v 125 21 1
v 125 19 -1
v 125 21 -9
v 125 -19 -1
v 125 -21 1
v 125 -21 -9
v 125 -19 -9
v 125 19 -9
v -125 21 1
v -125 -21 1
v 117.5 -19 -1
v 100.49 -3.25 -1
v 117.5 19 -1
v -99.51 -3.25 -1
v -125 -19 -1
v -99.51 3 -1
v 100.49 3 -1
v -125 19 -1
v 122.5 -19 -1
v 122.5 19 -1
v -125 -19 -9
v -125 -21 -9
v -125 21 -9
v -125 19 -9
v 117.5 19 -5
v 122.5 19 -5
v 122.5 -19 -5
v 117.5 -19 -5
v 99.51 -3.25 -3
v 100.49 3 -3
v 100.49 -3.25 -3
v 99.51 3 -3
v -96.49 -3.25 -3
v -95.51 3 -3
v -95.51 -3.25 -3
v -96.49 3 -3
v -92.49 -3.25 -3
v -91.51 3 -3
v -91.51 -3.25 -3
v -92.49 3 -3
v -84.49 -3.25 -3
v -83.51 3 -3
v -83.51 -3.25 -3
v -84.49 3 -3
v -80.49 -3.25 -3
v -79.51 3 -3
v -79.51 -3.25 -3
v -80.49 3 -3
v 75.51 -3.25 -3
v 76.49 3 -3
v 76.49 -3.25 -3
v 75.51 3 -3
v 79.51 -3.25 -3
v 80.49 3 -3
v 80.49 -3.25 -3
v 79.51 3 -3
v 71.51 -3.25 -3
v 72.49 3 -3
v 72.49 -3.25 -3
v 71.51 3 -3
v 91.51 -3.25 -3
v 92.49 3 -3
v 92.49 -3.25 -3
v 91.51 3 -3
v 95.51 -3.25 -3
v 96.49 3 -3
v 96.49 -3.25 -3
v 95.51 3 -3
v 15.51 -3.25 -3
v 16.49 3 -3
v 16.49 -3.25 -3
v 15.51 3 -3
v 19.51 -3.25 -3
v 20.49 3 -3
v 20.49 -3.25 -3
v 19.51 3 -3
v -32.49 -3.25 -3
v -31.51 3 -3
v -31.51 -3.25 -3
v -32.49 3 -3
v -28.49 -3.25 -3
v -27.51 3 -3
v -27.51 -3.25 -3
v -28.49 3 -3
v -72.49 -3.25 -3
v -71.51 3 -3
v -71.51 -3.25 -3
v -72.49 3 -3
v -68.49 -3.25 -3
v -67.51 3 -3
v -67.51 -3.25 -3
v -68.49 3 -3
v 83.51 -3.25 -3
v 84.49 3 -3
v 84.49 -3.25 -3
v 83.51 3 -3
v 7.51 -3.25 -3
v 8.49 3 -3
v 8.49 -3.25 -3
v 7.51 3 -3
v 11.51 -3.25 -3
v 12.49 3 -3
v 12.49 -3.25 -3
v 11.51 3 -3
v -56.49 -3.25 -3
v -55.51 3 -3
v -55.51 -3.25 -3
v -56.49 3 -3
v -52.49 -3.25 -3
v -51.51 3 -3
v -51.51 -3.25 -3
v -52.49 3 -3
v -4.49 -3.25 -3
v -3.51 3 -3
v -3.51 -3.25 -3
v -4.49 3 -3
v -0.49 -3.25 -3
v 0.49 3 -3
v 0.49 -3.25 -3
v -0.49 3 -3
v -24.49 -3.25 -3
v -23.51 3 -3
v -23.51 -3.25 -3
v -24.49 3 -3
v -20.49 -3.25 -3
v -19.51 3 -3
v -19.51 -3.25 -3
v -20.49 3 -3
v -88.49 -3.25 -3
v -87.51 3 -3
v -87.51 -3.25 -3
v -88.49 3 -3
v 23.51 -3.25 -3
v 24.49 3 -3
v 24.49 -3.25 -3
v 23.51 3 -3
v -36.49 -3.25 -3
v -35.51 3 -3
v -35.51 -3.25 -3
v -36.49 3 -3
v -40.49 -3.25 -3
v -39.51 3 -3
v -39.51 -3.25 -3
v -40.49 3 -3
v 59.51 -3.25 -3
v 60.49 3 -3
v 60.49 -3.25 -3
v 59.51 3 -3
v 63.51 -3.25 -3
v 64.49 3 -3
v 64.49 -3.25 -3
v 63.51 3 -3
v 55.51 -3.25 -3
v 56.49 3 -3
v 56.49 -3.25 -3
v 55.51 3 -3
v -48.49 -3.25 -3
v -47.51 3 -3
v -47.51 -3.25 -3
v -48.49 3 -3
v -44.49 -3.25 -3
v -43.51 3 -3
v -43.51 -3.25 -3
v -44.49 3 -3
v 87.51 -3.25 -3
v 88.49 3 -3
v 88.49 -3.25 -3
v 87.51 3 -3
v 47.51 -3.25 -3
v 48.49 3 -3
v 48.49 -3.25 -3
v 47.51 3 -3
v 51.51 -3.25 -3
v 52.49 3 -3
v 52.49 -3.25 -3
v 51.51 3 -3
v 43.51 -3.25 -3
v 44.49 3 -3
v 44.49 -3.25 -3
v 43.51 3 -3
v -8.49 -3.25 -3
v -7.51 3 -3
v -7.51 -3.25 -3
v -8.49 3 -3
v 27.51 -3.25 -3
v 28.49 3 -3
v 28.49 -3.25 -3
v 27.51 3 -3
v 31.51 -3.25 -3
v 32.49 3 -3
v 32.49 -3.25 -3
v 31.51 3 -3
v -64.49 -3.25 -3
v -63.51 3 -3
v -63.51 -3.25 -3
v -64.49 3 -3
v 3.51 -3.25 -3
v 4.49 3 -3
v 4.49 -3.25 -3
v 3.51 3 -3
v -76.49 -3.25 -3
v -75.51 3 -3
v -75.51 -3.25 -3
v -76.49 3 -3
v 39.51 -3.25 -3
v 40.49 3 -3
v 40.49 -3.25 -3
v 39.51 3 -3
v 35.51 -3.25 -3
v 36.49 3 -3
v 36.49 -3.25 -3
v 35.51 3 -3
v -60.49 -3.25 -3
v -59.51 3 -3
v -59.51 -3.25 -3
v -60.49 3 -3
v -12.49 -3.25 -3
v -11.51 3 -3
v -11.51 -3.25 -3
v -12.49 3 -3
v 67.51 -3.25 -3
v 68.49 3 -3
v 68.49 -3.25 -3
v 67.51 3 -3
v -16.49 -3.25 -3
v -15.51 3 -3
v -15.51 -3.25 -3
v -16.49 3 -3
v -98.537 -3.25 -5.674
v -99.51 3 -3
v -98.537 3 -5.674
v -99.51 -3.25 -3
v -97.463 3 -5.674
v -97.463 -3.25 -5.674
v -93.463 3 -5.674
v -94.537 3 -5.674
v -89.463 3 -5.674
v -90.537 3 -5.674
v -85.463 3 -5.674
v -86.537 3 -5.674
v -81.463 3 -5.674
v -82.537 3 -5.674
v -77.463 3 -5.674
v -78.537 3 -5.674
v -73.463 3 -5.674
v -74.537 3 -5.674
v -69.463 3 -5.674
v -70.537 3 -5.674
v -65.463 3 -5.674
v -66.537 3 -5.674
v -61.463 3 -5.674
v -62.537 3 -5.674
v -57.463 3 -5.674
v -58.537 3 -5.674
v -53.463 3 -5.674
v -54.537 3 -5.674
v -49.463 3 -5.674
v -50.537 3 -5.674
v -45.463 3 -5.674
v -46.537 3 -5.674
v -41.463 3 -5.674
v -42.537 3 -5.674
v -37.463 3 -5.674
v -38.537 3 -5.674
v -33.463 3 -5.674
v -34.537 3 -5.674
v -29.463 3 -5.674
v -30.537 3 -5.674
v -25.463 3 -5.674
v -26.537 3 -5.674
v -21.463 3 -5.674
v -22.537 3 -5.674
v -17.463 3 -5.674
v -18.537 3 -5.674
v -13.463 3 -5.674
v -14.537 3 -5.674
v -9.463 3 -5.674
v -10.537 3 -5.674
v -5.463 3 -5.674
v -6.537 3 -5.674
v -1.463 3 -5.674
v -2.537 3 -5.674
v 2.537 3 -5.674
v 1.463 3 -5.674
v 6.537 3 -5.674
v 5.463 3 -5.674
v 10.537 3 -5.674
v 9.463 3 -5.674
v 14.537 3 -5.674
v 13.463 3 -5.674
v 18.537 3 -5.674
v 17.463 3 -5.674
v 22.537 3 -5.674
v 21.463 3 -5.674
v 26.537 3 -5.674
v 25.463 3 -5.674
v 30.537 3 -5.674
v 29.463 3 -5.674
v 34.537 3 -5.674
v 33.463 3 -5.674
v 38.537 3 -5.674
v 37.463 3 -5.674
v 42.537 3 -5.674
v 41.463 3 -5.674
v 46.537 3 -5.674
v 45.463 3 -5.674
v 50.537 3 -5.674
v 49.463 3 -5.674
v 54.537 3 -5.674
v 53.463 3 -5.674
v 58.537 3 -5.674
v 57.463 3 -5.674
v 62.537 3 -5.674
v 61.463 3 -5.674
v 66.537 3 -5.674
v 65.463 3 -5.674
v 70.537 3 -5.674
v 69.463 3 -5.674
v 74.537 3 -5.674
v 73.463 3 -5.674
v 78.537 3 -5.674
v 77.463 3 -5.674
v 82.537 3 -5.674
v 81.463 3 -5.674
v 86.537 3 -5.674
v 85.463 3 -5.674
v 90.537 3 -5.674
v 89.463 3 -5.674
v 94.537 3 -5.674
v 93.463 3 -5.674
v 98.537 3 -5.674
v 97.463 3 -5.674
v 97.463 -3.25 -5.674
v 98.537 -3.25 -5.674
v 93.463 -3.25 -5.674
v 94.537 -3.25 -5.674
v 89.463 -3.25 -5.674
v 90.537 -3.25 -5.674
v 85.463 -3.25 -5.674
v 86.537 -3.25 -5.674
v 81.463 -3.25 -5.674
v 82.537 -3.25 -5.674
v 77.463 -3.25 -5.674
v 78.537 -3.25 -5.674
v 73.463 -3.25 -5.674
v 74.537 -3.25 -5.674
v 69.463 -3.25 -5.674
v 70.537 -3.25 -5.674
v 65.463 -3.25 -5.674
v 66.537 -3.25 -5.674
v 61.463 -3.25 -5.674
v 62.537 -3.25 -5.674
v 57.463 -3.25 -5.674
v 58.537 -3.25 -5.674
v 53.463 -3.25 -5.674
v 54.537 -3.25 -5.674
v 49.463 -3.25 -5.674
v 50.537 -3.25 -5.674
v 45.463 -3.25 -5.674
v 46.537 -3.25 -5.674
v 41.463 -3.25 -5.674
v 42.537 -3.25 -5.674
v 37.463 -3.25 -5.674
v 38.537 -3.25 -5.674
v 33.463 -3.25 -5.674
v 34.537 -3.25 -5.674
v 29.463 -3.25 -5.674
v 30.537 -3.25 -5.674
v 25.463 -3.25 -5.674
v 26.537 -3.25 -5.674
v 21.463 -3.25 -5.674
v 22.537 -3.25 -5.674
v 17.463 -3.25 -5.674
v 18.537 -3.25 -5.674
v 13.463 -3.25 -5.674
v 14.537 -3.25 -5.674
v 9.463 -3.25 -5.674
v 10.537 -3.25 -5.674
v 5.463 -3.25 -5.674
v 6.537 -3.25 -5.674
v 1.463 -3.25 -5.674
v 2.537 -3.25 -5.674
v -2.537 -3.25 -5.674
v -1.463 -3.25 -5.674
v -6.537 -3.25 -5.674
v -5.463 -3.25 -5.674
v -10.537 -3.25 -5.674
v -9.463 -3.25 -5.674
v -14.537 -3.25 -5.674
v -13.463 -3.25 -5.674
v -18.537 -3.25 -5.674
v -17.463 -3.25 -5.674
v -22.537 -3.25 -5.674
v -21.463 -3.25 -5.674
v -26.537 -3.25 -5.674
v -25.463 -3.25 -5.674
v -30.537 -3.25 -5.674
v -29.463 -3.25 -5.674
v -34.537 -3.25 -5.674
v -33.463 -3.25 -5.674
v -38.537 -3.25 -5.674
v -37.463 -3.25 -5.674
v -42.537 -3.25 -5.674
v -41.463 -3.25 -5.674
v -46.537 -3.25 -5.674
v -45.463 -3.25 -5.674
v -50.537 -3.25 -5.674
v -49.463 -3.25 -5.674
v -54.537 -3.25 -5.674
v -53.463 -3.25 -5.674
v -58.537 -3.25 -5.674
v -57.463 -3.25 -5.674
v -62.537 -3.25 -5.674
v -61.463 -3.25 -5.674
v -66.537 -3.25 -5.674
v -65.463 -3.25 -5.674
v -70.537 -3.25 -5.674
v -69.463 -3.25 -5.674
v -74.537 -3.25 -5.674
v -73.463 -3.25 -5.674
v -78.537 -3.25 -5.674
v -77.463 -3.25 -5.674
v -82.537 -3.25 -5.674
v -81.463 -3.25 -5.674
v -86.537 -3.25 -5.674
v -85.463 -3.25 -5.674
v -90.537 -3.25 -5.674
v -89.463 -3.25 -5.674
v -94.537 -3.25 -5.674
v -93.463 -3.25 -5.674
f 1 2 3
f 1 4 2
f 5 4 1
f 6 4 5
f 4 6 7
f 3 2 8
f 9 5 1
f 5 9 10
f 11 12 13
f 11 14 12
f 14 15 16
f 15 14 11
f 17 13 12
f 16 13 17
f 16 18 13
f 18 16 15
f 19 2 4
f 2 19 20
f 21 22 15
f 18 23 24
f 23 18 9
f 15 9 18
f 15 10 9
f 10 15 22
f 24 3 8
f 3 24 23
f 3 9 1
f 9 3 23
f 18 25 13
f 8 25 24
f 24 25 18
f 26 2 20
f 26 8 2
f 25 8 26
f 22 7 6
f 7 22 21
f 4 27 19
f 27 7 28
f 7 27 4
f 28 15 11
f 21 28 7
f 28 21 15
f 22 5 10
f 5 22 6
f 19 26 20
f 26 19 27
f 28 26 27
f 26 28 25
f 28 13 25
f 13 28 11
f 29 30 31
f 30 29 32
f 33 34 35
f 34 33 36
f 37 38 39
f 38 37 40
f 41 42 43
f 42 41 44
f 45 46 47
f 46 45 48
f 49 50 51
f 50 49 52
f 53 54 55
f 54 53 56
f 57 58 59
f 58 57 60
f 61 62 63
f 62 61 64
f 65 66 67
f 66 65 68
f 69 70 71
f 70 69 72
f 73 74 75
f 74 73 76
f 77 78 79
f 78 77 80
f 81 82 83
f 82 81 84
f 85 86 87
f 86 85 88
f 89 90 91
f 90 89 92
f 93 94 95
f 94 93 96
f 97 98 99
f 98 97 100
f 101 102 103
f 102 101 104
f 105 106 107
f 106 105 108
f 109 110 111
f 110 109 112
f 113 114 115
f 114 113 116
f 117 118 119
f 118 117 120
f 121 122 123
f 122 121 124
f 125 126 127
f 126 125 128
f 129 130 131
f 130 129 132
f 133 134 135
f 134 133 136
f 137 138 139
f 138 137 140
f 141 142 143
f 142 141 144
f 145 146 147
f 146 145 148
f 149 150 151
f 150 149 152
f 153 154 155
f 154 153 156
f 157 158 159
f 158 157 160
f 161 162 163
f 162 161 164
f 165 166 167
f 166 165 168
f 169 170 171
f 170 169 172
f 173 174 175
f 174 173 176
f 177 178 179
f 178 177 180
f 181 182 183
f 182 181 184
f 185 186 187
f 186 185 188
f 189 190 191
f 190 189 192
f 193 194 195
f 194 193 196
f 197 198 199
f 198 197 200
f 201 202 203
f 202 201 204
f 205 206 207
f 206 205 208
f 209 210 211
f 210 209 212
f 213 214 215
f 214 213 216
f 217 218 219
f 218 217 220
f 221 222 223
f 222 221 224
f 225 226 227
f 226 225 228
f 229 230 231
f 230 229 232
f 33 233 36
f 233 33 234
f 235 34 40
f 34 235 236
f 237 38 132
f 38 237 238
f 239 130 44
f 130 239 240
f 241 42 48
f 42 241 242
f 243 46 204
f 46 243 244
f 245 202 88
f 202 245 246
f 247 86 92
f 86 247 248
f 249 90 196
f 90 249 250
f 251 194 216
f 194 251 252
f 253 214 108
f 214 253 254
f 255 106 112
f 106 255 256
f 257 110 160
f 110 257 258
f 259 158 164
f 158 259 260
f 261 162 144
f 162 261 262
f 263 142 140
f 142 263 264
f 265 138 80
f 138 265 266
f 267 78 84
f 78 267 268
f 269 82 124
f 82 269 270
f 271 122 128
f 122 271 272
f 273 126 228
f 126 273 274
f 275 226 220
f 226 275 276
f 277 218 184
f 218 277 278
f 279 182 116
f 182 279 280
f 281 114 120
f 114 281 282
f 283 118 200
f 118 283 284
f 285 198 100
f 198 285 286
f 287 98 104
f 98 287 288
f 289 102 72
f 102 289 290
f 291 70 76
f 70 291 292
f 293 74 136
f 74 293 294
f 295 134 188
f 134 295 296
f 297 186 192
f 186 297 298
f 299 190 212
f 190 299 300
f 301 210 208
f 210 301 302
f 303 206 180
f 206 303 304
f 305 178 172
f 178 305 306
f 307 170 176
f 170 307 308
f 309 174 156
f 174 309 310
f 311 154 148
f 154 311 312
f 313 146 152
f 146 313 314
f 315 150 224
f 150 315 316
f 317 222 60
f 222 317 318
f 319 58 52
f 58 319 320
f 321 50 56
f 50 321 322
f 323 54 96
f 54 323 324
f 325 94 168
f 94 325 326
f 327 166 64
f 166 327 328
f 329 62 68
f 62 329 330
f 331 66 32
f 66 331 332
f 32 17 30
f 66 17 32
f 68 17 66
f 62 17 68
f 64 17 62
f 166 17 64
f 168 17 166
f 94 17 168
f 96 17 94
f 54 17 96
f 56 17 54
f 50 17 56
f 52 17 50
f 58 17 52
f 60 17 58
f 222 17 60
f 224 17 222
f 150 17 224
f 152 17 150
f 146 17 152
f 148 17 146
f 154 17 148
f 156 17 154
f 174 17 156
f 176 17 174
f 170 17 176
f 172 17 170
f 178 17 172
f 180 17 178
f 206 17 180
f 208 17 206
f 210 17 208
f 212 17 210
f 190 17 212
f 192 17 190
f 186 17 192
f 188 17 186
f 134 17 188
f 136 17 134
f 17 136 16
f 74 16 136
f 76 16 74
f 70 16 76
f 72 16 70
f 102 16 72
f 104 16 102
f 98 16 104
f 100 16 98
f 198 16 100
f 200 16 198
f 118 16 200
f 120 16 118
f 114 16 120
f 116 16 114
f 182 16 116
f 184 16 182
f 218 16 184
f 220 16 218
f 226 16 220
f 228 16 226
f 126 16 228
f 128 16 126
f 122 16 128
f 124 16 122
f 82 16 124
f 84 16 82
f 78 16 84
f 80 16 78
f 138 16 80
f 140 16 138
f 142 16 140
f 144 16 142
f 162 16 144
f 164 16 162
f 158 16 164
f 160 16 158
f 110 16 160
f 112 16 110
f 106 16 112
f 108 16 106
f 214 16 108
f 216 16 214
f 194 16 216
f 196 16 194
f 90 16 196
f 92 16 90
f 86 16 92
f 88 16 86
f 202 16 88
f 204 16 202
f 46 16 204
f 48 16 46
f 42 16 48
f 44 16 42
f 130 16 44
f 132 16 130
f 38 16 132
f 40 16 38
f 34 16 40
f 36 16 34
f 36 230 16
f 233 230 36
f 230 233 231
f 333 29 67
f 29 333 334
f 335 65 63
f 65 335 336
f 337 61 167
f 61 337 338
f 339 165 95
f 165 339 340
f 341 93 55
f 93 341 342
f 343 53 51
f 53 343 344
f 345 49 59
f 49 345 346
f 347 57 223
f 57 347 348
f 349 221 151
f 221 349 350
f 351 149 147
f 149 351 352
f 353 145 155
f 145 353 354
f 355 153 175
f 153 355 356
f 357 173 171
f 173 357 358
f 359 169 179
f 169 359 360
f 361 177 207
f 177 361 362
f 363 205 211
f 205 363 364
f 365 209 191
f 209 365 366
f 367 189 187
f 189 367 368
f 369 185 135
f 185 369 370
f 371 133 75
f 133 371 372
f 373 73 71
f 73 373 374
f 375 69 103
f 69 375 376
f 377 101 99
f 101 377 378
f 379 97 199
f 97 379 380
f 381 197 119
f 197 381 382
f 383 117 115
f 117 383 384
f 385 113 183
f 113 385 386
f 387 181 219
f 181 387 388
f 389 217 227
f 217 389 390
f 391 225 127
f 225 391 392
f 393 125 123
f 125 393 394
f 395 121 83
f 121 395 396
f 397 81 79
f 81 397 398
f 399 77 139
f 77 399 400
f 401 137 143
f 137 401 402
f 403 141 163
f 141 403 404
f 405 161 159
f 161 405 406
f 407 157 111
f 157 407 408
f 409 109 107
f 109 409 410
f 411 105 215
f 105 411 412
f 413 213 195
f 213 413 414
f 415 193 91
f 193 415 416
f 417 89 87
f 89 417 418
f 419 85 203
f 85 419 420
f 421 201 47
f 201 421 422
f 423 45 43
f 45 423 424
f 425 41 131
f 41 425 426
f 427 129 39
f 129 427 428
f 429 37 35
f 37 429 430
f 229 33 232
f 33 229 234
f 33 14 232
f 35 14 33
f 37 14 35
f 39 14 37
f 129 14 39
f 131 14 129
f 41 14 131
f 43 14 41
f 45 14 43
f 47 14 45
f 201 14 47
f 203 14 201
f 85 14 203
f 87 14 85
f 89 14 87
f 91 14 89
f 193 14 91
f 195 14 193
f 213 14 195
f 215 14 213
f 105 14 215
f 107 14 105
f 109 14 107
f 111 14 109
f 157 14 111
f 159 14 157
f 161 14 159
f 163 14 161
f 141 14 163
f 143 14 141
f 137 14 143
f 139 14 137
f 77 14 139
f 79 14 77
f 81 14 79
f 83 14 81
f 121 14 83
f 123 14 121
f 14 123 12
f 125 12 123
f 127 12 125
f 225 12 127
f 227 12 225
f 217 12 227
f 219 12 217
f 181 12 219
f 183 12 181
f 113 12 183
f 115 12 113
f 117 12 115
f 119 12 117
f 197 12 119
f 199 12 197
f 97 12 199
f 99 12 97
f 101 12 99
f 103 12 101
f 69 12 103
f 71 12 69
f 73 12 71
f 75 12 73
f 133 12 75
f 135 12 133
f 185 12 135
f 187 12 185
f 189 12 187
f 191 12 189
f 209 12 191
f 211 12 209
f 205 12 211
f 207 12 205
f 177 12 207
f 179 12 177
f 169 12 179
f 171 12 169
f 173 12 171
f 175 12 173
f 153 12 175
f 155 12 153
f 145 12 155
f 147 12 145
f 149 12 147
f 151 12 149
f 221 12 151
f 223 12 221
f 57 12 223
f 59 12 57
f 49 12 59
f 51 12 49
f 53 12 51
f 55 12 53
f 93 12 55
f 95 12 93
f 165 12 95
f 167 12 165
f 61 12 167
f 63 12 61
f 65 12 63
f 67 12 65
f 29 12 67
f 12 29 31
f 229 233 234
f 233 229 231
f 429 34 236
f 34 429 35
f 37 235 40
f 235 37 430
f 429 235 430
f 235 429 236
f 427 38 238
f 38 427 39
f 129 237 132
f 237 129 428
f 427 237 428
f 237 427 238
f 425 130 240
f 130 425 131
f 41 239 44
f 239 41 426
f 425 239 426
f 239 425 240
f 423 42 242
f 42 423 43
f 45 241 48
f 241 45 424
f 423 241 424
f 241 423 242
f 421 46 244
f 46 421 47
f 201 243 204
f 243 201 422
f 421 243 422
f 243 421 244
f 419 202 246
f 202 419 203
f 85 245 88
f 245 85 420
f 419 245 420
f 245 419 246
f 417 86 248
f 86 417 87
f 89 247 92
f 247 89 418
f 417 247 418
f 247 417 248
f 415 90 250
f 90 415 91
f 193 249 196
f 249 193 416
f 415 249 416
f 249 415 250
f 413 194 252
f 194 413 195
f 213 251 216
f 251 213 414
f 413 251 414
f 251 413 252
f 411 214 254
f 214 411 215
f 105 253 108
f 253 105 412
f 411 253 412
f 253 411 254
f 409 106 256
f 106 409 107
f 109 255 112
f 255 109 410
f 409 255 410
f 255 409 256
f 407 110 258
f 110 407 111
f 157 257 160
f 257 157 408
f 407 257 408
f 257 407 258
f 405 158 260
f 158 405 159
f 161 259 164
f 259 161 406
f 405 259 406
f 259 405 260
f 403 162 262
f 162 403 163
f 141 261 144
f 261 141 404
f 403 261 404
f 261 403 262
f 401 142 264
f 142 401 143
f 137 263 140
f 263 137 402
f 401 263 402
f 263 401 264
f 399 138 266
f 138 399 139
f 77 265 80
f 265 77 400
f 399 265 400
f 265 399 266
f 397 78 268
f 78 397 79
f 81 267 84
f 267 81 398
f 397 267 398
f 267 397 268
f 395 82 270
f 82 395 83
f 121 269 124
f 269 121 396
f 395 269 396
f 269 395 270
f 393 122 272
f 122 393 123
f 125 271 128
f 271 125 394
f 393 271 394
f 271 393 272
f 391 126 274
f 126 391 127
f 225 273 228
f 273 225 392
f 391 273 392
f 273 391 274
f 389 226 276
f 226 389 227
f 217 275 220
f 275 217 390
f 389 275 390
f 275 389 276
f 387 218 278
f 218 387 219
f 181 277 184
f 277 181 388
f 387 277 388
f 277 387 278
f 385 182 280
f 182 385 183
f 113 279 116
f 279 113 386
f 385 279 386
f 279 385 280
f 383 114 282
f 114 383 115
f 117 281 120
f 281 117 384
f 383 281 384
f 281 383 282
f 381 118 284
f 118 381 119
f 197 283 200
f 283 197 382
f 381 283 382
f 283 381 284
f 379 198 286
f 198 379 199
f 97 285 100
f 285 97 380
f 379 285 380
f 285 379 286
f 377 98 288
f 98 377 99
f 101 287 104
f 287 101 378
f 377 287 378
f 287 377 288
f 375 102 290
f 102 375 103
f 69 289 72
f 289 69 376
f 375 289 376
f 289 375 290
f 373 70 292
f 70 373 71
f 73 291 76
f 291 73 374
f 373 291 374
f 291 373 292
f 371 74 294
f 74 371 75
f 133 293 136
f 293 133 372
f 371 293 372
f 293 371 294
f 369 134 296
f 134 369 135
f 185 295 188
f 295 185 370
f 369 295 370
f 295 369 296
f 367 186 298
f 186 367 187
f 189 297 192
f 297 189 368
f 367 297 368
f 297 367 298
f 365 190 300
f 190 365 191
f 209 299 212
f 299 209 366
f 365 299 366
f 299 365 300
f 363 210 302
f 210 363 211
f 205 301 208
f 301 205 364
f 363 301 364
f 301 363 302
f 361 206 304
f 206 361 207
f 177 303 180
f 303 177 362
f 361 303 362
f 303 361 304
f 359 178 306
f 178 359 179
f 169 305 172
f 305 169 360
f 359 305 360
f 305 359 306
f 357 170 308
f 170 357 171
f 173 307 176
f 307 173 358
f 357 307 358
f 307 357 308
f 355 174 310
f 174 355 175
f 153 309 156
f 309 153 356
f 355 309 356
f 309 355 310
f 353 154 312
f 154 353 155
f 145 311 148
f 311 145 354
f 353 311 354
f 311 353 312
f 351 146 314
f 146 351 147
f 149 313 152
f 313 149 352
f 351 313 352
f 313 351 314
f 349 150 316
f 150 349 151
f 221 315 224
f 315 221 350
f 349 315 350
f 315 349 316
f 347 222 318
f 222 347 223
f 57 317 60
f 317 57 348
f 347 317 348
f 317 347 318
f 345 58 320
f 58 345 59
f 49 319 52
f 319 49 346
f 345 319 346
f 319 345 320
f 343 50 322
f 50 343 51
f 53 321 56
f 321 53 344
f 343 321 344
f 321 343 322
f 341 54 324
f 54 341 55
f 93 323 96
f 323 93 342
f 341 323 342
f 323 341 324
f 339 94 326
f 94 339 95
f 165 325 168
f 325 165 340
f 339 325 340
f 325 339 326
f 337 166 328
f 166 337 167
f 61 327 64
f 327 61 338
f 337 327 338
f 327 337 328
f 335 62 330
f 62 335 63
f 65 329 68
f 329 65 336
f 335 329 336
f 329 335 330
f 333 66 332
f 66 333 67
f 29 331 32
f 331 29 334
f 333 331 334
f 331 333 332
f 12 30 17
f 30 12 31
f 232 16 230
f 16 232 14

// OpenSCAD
//============================================================
pi=3.1415926535897932384626433832795;
$fn=50;
module rack(cp, N, width, thickness){
// cp = circular pitch - for rack = pitch in mm/per tooth
// N = number of teeth
// width = width of rack
// thickness = thickness of support under teeth (0 for no support)

	a = 1.0*cp/pi; // addendum (also known as "module")
	d = 1.1*cp/pi; // dedendum (this is set by a standard)
	height=(d+a);

	// find the tangent of pressure angle once
	tanPA = tan(20);
	// length of bottom and top horizontal segments of tooth profile
	botL = (cp/2 - 2*d*tanPA);
	topL = (cp/2 - 2*a*tanPA);

	slantLng=tanPA*height;
	realBase=2*slantLng+topL;

	offset=topL+botL+2*slantLng;
	length=(realBase+botL)*N;

	supportSize=width;
	translate([botL/2,0,0])
	rotate([90,0,0]){
		translate([0,supportSize/2,0]){
			union(){
				cube(size=[length,width,thickness],center=true);
				for (i = [0:N-1]){
					translate([i*offset-length/2+realBase/2,0,thickness/2]){
						trapezoid([topL,supportSize],[realBase,supportSize],height);
						}
					}
				}
			}
		}
	}

//==========================================================
module pinion (cp, N, width, shaft_diameter, backlash=0){
// cp= circular pitch - for pinion pitch in mm/per as measured along the ptich radius (~1/2 way up tooth)
// N= number of teeth
// width= width of the gear
// shaft_diameter= diameter of hole for shaft
// backlash - I think this is just a bodge for making things fit when printed but I never tested it

	if (cp==false && diametral_pitch==false) 
		echo("MCAD ERROR: pinion module needs either a diametral_pitch or cp");

	//Convert diametrial pitch to our native circular pitch
	cp = (cp!=false?cp:180/diametral_pitch);

	// Pitch diameter: Diameter of pitch circle.
	pitch_diameter  =  N * cp / pi;
	pitch_radius = pitch_diameter/2;
	echo ("Teeth:", N, " Pitch radius:", pitch_radius);
	// Base Circle
	base_radius = pitch_radius*cos(20);

	// Addendum: Radial distance from pitch circle to outside circle.
	addendum = cp/pi;

	//Outer Circle
	outer_radius = pitch_radius+addendum;

	// Dedendum: Radial distance from pitch circle to root diameter
	dedendum = addendum*1.1;

	// Root diameter: Diameter of bottom of tooth spaces.
	root_radius = pitch_radius-dedendum;

	backlash_angle = backlash / pitch_radius * 180 / pi;
	half_thick_angle = (360 / N - backlash_angle) / 4;

	difference(){
		linear_extrude (height=width, convexity=10, twist=0)
		pinion_shape(N, pitch_radius = pitch_radius, root_radius = root_radius,
			base_radius = base_radius, outer_radius = outer_radius,
			half_thick_angle = half_thick_angle, involute_facets=0);

		translate([0,0,-1]) cylinder(r=shaft_diameter/2,h=2+width);
		}

	echo("Root radius =",root_radius,"\nPitch radius=",pitch_radius,"\n Tip radius=",outer_radius,"\n");
	}

module pinion_shape ( N, pitch_radius, root_radius, base_radius, outer_radius, half_thick_angle, involute_facets) {
	union(){
		rotate (half_thick_angle) circle ($fn=N*2, r=root_radius);
		for (i = [1:N]) {
			rotate ([0,0,i*360/N]) {
				involute_pinion_tooth (
					pitch_radius = pitch_radius,
					root_radius = root_radius,
					base_radius = base_radius,
					outer_radius = outer_radius,
					half_thick_angle = half_thick_angle,
					involute_facets=involute_facets);
				}
			}
		}
	}

module involute_pinion_tooth ( pitch_radius, root_radius, base_radius, outer_radius, half_thick_angle, involute_facets) {
	min_radius = max (base_radius,root_radius);

	pitch_point = involute (base_radius, involute_intersect_angle (base_radius, pitch_radius));
	pitch_angle = atan2 (pitch_point[1], pitch_point[0]);
	centre_angle = pitch_angle + half_thick_angle;

	start_angle = involute_intersect_angle (base_radius, min_radius);
	stop_angle = involute_intersect_angle (base_radius, outer_radius);

	res=(involute_facets!=0)?involute_facets:($fn==0)?5:$fn/4;

	union () {
		for (i=[1:res])
		assign ( point1=involute (base_radius,start_angle+(stop_angle - start_angle)*(i-1)/res), point2=involute (base_radius,start_angle+(stop_angle - start_angle)*i/res)) {
			assign (
				side1_point1=rotate_point (centre_angle, point1),
				side1_point2=rotate_point (centre_angle, point2),
				side2_point1=mirror_point (rotate_point (centre_angle, point1)),
				side2_point2=mirror_point (rotate_point (centre_angle, point2))) {
				polygon ( points=[[0,0],side1_point1,side1_point2,side2_point2,side2_point1], paths=[[0,1,2,3,4,0]]);
				}
			}
		}
	}

// Mathematical Functions
//===============

// Finds the angle of the involute about the base radius at the given distance (radius) from it's center.
//source: http://www.mathhelpforum.com/math-help/geometry/136011-circle-involute-solving-y-any-given-x.html

function involute_intersect_angle (base_radius, radius) = sqrt (pow (radius/base_radius, 2) - 1) * 180 / pi;

// Calculate the involute position for a given base radius and involute angle.

function rotated_involute(rotate,base_radius,involute_angle)=[cos(rotate)*involute(base_radius, involute_angle)[0]+sin(rotate)*involute(base_radius, involute_angle)[1],cos(rotate)*involute(base_radius, involute_angle)[1]-sin(rotate)*involute(base_radius, involute_angle)[0]];

function mirror_point(coord)=[coord[0],-coord[1]];

function rotate_point(rotate,coord)=[cos(rotate)*coord[0]+sin(rotate)*coord[1],cos(rotate)*coord[1]-sin(rotate)*coord[0]];

function involute (base_radius, involute_angle)=[base_radius*(cos(involute_angle)+involute_angle*pi/180*sin(involute_angle)),base_radius*(sin(involute_angle)-involute_angle*pi/180*cos(involute_angle))];

module trapezoid(top,base,height){
	//echo ("test",base[0]);
	basePT1=[ -base[0]/2, base[1]/2, 0];
	basePT2=[ base[0]/2, base[1]/2, 0];
	basePT3=[ base[0]/2, -base[1]/2, 0];
	basePT4=[ -base[0]/2, -base[1]/2, 0];
	topPT1=[ -top[0]/2, top[1]/2, height];
	topPT2=[ top[0]/2, top[1]/2, height];
	topPT3=[ top[0]/2, -top[1]/2, height];
	topPT4=[ -top[0]/2, -top[1]/2, height];
	polyhedron(points=[ basePT1, basePT2, basePT3, basePT4, topPT1, topPT2, topPT3, topPT4],triangles=[[0,1,2], [0,2,3],[3,7,0], [7,4,0],[1,6,2], [1,5,6],[2,6,3], [3,6,7],[5,1,0],[4,5,0],[7,5,4],[5,7,6]]);
	}
//==========================================================




//--------------------------------------------------------------------------
module cuvetteHolderTray(){
	//mainBody
	translate([0,0,0]) color([.3,.55,.95]) cube(size=[250,40,2],center=true);
	//rails
	translate([0,20,-4]) color([.3,.55,.95]) cube(size=[250,2,10],center=true);
	translate([0,-20,-4]) color([.3,.55,.95]) cube(size=[250,2,10],center=true);
	translate([120,0,-2.5]) color([.3,.55,.95]) cube(size=[5,40,5],center=true);
}


translate([0,0,0]){
//	cuvetteHolderBottom();
	translate([0,0,0]){
		cuvetteHolderTray();
	}
	rotate([90,0,0]){
		translate([0,-2,-3]){
			rack(4,50,6.25,2);
		}
	}
}
